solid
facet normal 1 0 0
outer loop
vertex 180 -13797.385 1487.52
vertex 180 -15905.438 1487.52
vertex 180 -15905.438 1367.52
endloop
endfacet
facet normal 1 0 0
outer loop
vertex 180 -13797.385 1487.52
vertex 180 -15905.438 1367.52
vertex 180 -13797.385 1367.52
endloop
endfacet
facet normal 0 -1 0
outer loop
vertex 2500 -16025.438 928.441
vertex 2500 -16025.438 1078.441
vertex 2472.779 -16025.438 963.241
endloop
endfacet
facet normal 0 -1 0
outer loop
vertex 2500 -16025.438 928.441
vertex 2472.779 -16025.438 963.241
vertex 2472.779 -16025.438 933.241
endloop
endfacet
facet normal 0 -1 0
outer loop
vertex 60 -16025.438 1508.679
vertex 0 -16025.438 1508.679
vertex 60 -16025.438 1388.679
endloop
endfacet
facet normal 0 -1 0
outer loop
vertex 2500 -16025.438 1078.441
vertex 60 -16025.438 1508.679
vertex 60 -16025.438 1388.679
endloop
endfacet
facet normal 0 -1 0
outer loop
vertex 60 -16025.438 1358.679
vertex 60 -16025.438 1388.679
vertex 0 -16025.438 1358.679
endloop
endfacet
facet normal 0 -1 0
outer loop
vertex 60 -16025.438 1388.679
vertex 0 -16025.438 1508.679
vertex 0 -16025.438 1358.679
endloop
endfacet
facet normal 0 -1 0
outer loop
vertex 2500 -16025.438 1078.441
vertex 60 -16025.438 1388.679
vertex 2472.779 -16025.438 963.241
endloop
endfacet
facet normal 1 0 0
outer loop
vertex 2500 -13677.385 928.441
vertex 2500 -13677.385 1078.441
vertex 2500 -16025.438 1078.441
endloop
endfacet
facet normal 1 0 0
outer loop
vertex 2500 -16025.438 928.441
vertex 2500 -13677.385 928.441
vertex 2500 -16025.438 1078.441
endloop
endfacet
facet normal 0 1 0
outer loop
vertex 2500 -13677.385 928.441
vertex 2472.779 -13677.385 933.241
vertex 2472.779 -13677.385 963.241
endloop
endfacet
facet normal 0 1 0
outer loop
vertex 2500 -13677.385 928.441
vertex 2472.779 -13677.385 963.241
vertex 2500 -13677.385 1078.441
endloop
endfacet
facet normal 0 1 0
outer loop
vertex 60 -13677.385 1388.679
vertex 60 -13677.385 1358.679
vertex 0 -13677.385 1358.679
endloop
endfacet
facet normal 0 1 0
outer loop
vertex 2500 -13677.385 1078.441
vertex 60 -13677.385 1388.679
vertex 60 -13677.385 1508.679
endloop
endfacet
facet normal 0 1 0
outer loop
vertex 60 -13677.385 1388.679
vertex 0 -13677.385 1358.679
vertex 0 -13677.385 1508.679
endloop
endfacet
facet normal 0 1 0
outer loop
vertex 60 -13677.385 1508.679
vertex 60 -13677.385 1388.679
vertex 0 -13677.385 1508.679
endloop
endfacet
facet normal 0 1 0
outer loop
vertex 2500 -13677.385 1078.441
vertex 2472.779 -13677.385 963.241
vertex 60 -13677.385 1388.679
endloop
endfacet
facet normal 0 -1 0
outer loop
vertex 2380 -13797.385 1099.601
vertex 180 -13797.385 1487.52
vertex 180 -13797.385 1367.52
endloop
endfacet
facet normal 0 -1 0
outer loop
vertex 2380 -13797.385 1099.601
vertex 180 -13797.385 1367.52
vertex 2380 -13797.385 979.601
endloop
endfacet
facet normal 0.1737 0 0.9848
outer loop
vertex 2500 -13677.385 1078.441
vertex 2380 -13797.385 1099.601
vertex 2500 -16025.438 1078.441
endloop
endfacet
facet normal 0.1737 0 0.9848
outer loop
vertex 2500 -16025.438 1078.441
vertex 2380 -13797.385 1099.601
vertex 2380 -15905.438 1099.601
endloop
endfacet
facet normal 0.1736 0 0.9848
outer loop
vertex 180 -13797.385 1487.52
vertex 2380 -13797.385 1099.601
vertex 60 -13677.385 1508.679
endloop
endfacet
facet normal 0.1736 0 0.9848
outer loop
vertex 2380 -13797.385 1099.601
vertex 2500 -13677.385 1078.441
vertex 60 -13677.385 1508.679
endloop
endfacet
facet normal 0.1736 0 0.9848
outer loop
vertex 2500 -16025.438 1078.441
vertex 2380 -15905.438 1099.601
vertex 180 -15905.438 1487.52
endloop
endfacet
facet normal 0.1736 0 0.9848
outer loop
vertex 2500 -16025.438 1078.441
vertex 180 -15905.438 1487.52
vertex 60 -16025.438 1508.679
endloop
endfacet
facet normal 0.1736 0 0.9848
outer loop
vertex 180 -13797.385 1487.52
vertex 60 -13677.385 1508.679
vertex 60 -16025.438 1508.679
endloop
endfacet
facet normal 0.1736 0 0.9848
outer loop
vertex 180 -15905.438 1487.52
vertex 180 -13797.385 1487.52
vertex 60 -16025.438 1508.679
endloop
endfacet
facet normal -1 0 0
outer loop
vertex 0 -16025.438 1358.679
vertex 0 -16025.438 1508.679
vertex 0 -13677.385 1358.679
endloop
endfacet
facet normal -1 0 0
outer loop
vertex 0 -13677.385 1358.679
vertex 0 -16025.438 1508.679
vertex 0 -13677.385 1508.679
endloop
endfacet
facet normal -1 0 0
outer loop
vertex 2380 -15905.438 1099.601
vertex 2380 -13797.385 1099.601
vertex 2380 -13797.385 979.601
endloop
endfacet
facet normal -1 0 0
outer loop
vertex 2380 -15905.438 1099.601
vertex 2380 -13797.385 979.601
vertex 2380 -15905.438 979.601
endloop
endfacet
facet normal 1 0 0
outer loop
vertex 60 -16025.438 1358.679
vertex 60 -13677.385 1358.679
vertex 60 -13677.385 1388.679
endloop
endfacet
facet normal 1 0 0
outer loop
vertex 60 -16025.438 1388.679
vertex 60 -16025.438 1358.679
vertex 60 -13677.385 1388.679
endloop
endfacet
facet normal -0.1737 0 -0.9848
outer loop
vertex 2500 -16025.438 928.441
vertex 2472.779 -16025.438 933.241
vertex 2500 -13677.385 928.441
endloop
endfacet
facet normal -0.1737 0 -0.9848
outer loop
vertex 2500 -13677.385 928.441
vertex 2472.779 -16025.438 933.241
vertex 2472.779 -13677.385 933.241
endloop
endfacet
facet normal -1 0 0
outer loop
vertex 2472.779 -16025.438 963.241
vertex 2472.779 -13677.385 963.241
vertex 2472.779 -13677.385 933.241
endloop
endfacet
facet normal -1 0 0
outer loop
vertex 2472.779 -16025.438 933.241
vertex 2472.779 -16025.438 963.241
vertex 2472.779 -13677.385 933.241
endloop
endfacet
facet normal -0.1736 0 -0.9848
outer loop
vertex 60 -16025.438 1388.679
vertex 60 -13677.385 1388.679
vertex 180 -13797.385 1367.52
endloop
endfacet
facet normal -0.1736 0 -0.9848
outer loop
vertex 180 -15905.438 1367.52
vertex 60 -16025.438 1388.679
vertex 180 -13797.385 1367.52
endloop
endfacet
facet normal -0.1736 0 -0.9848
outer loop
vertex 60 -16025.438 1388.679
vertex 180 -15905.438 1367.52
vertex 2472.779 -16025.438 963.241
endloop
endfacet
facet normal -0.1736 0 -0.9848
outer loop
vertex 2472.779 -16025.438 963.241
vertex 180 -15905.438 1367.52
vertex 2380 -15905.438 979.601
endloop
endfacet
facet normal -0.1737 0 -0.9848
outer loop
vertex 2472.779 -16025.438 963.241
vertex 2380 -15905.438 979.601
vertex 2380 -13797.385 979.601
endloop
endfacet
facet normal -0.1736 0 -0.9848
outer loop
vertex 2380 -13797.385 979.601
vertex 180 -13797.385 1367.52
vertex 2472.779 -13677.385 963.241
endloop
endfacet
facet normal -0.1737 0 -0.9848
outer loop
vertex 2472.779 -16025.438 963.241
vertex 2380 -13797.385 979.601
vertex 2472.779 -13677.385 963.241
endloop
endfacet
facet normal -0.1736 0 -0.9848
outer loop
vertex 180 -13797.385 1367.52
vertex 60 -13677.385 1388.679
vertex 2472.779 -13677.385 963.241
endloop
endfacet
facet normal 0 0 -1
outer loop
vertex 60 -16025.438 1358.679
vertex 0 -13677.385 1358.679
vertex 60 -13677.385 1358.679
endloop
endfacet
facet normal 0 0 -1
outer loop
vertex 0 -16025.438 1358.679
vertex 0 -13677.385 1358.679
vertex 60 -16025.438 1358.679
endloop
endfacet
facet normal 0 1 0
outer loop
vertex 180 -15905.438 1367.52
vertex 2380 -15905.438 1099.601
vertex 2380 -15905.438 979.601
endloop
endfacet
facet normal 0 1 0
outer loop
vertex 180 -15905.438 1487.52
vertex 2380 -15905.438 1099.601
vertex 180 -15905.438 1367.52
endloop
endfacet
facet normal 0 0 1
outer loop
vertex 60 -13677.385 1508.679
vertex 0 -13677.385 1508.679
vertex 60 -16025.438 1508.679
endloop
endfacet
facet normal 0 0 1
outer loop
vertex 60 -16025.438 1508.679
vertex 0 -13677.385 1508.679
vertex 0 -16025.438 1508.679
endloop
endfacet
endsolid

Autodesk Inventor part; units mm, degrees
sketch "Sketch1" plane through (0, 0, 0) normal (1, 0, 0) x (0, 1, 0)
  line L0 (-16025.4384, 1509.0974) -> (-16025.4384, 1358.9468)
  line L1 (-15853.0538, 1508.6791) -> (-16025.4384, 1508.6791)
  line L2 (-13852.385, -1490.9026) -> (-13852.385, 1509.0974)
  line L3 (-13502.385, 1508.6791) -> (-13502.385, 1509.0974)
  line L4 (-13852.385, 1509.0974) -> (-13677.385, 1509.0974)
  line L5 (-15853.0538, -1491.3209) -> (-15853.0538, 1508.6791)
  line L6 (-16025.4384, 1358.9468) -> (-16025.4384, -1491.3209)
  line L7 (-16025.4384, -1491.3209) -> (-13677.385, -1491.3209)
  line L8 (-13677.385, -1491.3209) -> (-13677.385, 1509.0974)
  line L9 (-13677.385, 1508.6791) -> (-16025.4384, 1508.6791)
  line L10 (-16025.4384, 1508.6791) -> (-16025.4384, 1358.6791)
  line L11 (-16025.4384, 1508.6791) -> (-13677.385, 1508.6791)
  line L12 (-13677.385, 1508.6791) -> (-13677.385, 1358.6791)
  line L13 (-13677.385, 1358.6791) -> (-16025.4384, 1358.6791)
  line L14 (-16025.4384, 1358.6791) -> (-16025.4384, 1508.6791)
  point P0 (0, 0)
  dimension "d2" = 150
ref_plane "Work Plane2" through (2500, 0, 0) normal (1, 0, 0) x (0, 1, 0)
ref_plane "Work Plane1" through (0, 0, 0) normal (1, 0, 0) x (0, 1, 0)
extrude "Extrusion1" add sketch "Sketch1" along normal blind 60 contours L1 L5 L13 L6 L0 | L9 L2 L13 L5 | L9 L8 L13 L2
ref_plane "Work Plane3" through (60, 0, 0) normal (1, 0, 0) x (0, 0, -1)
sketch "Sketch3" plane through (60, 0, 0) normal (1, 0, 0) x (0, 0, -1)
  line L0 (-1358.6791, -13677.385) -> (-1508.6791, -13677.385) projected
  line L1 (-1508.6791, -13677.385) -> (-1508.6791, -16025.4384) projected
  line L2 (-1508.6791, -16025.4384) -> (-1358.6791, -16025.4384) projected
  line L3 (-1358.6791, -16025.4384) -> (-1358.6791, -13677.385) projected
  point P0 (0, 0)
sketch "Sketch5" plane through (2500, 0, 0) normal (1, 0, 0) x (0, 1, 0)
  line L0 (-16025.4384, 1358.9468) -> (-16025.4384, -1491.3209) projected
  point P0 (0, 0)
ref_plane "Work Plane4" through (60, -16025.4384, 1508.6791) normal (0, -1, 0) x (0, 0, -1)
sketch "Sketch6" plane through (60, -16025.4384, 1508.6791) normal (0, -1, 0) x (0, 0, -1)
  line L0 (0, 0) -> (150, 0) projected
  line L1 (149.7323, 2440) -> (3000, 2440) projected
  line L2 (0, 0) -> (430.2378, 2440)
  line L3 (0, 0) -> (2477.6409, 0) construction
  line L4 (150, 0) -> (580.2378, 2440)
  line L5 (150, 0) -> (2627.6409, 0) construction
  line L6 (580.2378, 2440) -> (430.2378, 2440)
  point P0 (1508.6791, -60)
  dimension "d6" = 80
  dimension "d7" = 80
sketch "Sketch9" plane through (2500, 0, 0) normal (1, 0, 0) x (0, 1, 0)
  line L0 (-13677.385, -1491.3209) -> (-13677.385, 1509.0974) projected
  line L1 (-16025.4384, 1078.4413) -> (-13677.385, 1078.4413)
  line L2 (-13677.385, 1078.4413) -> (-13677.385, 928.4413)
  line L3 (-13677.385, 928.4413) -> (-16025.4384, 928.4413)
  line L4 (-16025.4384, 928.4413) -> (-16025.4384, 1078.4413)
  point P0 (0, 0)
  point P1 (-16025.4384, 928.4413)
loft "Loft2" add profiles "Sketch9" section 2 edges at (60, -13677.385, 1433.6791) (60, -15939.2461, 1508.6791) (60, -16025.4384, 1433.813) (60, -14851.4117, 1358.6791)
sketch "Sketch10" plane through (0, -13677.385, 1508.6791) normal (0, 1, 0) x (1, 0, 0)
  line L0 (60, 150) -> (60, 120)
  line L1 (60, 120) -> (2472.779, 545.438)
  line L2 (60, 120) -> (2510, 120) construction
  line L3 (0, 150) -> (60, 150) projected
  line L4 (60, 150) -> (2472.779, 575.438)
  line L5 (2472.779, 545.438) -> (2472.779, 575.438)
  point P0 (0, 1508.6791)
  dimension "d16" = 30
  dimension "d17" = 2450
  dimension "d18" = 10
  dimension "d19" = 2450
extrude "Extrusion2" cut sketch "Sketch10" against normal through all
sketch "Sketch11" plane through (0, -16025.4384, 1508.6791) normal (0, 0, 1) x (1, 0, 0)
  line L0 (2500, 0) -> (2500, 2348.0534) projected
  line L1 (2500, 2348.0534) -> (60, 2348.0534) projected
  line L2 (60, 2348.0534) -> (60, 0) projected
  line L3 (2500, 0) -> (60, 0) projected
  line L4 (2500, 0) -> (60, 0) projected
  line L5 (2500, 0) -> (2380, 0)
  line L6 (2380, 0) -> (2380, 120)
  line L7 (2380, 120) -> (2500, 120)
  line L8 (2500, 120) -> (2500, 0)
  line L9 (60, 2348.0534) -> (180, 2348.0534)
  line L10 (180, 2348.0534) -> (180, 2228.0534)
  line L11 (180, 2228.0534) -> (60, 2228.0534)
  line L12 (60, 2228.0534) -> (60, 2348.0534)
  line L13 (2380, 120) -> (180, 120)
  line L14 (180, 120) -> (180, 2228.0534)
  line L15 (180, 2228.0534) -> (2380, 2228.0534)
  line L16 (2380, 2228.0534) -> (2380, 120)
  point P0 (0, 16025.4384)
  dimension "d22" = 120
  dimension "d23" = 120
  dimension "d24" = 120
  dimension "d25" = 120
extrude "Extrusion3" cut sketch "Sketch11" against normal through all contours L13 L14 L15 L16
properties part number "eave_frame_side_" material "Wood (Maple)"
